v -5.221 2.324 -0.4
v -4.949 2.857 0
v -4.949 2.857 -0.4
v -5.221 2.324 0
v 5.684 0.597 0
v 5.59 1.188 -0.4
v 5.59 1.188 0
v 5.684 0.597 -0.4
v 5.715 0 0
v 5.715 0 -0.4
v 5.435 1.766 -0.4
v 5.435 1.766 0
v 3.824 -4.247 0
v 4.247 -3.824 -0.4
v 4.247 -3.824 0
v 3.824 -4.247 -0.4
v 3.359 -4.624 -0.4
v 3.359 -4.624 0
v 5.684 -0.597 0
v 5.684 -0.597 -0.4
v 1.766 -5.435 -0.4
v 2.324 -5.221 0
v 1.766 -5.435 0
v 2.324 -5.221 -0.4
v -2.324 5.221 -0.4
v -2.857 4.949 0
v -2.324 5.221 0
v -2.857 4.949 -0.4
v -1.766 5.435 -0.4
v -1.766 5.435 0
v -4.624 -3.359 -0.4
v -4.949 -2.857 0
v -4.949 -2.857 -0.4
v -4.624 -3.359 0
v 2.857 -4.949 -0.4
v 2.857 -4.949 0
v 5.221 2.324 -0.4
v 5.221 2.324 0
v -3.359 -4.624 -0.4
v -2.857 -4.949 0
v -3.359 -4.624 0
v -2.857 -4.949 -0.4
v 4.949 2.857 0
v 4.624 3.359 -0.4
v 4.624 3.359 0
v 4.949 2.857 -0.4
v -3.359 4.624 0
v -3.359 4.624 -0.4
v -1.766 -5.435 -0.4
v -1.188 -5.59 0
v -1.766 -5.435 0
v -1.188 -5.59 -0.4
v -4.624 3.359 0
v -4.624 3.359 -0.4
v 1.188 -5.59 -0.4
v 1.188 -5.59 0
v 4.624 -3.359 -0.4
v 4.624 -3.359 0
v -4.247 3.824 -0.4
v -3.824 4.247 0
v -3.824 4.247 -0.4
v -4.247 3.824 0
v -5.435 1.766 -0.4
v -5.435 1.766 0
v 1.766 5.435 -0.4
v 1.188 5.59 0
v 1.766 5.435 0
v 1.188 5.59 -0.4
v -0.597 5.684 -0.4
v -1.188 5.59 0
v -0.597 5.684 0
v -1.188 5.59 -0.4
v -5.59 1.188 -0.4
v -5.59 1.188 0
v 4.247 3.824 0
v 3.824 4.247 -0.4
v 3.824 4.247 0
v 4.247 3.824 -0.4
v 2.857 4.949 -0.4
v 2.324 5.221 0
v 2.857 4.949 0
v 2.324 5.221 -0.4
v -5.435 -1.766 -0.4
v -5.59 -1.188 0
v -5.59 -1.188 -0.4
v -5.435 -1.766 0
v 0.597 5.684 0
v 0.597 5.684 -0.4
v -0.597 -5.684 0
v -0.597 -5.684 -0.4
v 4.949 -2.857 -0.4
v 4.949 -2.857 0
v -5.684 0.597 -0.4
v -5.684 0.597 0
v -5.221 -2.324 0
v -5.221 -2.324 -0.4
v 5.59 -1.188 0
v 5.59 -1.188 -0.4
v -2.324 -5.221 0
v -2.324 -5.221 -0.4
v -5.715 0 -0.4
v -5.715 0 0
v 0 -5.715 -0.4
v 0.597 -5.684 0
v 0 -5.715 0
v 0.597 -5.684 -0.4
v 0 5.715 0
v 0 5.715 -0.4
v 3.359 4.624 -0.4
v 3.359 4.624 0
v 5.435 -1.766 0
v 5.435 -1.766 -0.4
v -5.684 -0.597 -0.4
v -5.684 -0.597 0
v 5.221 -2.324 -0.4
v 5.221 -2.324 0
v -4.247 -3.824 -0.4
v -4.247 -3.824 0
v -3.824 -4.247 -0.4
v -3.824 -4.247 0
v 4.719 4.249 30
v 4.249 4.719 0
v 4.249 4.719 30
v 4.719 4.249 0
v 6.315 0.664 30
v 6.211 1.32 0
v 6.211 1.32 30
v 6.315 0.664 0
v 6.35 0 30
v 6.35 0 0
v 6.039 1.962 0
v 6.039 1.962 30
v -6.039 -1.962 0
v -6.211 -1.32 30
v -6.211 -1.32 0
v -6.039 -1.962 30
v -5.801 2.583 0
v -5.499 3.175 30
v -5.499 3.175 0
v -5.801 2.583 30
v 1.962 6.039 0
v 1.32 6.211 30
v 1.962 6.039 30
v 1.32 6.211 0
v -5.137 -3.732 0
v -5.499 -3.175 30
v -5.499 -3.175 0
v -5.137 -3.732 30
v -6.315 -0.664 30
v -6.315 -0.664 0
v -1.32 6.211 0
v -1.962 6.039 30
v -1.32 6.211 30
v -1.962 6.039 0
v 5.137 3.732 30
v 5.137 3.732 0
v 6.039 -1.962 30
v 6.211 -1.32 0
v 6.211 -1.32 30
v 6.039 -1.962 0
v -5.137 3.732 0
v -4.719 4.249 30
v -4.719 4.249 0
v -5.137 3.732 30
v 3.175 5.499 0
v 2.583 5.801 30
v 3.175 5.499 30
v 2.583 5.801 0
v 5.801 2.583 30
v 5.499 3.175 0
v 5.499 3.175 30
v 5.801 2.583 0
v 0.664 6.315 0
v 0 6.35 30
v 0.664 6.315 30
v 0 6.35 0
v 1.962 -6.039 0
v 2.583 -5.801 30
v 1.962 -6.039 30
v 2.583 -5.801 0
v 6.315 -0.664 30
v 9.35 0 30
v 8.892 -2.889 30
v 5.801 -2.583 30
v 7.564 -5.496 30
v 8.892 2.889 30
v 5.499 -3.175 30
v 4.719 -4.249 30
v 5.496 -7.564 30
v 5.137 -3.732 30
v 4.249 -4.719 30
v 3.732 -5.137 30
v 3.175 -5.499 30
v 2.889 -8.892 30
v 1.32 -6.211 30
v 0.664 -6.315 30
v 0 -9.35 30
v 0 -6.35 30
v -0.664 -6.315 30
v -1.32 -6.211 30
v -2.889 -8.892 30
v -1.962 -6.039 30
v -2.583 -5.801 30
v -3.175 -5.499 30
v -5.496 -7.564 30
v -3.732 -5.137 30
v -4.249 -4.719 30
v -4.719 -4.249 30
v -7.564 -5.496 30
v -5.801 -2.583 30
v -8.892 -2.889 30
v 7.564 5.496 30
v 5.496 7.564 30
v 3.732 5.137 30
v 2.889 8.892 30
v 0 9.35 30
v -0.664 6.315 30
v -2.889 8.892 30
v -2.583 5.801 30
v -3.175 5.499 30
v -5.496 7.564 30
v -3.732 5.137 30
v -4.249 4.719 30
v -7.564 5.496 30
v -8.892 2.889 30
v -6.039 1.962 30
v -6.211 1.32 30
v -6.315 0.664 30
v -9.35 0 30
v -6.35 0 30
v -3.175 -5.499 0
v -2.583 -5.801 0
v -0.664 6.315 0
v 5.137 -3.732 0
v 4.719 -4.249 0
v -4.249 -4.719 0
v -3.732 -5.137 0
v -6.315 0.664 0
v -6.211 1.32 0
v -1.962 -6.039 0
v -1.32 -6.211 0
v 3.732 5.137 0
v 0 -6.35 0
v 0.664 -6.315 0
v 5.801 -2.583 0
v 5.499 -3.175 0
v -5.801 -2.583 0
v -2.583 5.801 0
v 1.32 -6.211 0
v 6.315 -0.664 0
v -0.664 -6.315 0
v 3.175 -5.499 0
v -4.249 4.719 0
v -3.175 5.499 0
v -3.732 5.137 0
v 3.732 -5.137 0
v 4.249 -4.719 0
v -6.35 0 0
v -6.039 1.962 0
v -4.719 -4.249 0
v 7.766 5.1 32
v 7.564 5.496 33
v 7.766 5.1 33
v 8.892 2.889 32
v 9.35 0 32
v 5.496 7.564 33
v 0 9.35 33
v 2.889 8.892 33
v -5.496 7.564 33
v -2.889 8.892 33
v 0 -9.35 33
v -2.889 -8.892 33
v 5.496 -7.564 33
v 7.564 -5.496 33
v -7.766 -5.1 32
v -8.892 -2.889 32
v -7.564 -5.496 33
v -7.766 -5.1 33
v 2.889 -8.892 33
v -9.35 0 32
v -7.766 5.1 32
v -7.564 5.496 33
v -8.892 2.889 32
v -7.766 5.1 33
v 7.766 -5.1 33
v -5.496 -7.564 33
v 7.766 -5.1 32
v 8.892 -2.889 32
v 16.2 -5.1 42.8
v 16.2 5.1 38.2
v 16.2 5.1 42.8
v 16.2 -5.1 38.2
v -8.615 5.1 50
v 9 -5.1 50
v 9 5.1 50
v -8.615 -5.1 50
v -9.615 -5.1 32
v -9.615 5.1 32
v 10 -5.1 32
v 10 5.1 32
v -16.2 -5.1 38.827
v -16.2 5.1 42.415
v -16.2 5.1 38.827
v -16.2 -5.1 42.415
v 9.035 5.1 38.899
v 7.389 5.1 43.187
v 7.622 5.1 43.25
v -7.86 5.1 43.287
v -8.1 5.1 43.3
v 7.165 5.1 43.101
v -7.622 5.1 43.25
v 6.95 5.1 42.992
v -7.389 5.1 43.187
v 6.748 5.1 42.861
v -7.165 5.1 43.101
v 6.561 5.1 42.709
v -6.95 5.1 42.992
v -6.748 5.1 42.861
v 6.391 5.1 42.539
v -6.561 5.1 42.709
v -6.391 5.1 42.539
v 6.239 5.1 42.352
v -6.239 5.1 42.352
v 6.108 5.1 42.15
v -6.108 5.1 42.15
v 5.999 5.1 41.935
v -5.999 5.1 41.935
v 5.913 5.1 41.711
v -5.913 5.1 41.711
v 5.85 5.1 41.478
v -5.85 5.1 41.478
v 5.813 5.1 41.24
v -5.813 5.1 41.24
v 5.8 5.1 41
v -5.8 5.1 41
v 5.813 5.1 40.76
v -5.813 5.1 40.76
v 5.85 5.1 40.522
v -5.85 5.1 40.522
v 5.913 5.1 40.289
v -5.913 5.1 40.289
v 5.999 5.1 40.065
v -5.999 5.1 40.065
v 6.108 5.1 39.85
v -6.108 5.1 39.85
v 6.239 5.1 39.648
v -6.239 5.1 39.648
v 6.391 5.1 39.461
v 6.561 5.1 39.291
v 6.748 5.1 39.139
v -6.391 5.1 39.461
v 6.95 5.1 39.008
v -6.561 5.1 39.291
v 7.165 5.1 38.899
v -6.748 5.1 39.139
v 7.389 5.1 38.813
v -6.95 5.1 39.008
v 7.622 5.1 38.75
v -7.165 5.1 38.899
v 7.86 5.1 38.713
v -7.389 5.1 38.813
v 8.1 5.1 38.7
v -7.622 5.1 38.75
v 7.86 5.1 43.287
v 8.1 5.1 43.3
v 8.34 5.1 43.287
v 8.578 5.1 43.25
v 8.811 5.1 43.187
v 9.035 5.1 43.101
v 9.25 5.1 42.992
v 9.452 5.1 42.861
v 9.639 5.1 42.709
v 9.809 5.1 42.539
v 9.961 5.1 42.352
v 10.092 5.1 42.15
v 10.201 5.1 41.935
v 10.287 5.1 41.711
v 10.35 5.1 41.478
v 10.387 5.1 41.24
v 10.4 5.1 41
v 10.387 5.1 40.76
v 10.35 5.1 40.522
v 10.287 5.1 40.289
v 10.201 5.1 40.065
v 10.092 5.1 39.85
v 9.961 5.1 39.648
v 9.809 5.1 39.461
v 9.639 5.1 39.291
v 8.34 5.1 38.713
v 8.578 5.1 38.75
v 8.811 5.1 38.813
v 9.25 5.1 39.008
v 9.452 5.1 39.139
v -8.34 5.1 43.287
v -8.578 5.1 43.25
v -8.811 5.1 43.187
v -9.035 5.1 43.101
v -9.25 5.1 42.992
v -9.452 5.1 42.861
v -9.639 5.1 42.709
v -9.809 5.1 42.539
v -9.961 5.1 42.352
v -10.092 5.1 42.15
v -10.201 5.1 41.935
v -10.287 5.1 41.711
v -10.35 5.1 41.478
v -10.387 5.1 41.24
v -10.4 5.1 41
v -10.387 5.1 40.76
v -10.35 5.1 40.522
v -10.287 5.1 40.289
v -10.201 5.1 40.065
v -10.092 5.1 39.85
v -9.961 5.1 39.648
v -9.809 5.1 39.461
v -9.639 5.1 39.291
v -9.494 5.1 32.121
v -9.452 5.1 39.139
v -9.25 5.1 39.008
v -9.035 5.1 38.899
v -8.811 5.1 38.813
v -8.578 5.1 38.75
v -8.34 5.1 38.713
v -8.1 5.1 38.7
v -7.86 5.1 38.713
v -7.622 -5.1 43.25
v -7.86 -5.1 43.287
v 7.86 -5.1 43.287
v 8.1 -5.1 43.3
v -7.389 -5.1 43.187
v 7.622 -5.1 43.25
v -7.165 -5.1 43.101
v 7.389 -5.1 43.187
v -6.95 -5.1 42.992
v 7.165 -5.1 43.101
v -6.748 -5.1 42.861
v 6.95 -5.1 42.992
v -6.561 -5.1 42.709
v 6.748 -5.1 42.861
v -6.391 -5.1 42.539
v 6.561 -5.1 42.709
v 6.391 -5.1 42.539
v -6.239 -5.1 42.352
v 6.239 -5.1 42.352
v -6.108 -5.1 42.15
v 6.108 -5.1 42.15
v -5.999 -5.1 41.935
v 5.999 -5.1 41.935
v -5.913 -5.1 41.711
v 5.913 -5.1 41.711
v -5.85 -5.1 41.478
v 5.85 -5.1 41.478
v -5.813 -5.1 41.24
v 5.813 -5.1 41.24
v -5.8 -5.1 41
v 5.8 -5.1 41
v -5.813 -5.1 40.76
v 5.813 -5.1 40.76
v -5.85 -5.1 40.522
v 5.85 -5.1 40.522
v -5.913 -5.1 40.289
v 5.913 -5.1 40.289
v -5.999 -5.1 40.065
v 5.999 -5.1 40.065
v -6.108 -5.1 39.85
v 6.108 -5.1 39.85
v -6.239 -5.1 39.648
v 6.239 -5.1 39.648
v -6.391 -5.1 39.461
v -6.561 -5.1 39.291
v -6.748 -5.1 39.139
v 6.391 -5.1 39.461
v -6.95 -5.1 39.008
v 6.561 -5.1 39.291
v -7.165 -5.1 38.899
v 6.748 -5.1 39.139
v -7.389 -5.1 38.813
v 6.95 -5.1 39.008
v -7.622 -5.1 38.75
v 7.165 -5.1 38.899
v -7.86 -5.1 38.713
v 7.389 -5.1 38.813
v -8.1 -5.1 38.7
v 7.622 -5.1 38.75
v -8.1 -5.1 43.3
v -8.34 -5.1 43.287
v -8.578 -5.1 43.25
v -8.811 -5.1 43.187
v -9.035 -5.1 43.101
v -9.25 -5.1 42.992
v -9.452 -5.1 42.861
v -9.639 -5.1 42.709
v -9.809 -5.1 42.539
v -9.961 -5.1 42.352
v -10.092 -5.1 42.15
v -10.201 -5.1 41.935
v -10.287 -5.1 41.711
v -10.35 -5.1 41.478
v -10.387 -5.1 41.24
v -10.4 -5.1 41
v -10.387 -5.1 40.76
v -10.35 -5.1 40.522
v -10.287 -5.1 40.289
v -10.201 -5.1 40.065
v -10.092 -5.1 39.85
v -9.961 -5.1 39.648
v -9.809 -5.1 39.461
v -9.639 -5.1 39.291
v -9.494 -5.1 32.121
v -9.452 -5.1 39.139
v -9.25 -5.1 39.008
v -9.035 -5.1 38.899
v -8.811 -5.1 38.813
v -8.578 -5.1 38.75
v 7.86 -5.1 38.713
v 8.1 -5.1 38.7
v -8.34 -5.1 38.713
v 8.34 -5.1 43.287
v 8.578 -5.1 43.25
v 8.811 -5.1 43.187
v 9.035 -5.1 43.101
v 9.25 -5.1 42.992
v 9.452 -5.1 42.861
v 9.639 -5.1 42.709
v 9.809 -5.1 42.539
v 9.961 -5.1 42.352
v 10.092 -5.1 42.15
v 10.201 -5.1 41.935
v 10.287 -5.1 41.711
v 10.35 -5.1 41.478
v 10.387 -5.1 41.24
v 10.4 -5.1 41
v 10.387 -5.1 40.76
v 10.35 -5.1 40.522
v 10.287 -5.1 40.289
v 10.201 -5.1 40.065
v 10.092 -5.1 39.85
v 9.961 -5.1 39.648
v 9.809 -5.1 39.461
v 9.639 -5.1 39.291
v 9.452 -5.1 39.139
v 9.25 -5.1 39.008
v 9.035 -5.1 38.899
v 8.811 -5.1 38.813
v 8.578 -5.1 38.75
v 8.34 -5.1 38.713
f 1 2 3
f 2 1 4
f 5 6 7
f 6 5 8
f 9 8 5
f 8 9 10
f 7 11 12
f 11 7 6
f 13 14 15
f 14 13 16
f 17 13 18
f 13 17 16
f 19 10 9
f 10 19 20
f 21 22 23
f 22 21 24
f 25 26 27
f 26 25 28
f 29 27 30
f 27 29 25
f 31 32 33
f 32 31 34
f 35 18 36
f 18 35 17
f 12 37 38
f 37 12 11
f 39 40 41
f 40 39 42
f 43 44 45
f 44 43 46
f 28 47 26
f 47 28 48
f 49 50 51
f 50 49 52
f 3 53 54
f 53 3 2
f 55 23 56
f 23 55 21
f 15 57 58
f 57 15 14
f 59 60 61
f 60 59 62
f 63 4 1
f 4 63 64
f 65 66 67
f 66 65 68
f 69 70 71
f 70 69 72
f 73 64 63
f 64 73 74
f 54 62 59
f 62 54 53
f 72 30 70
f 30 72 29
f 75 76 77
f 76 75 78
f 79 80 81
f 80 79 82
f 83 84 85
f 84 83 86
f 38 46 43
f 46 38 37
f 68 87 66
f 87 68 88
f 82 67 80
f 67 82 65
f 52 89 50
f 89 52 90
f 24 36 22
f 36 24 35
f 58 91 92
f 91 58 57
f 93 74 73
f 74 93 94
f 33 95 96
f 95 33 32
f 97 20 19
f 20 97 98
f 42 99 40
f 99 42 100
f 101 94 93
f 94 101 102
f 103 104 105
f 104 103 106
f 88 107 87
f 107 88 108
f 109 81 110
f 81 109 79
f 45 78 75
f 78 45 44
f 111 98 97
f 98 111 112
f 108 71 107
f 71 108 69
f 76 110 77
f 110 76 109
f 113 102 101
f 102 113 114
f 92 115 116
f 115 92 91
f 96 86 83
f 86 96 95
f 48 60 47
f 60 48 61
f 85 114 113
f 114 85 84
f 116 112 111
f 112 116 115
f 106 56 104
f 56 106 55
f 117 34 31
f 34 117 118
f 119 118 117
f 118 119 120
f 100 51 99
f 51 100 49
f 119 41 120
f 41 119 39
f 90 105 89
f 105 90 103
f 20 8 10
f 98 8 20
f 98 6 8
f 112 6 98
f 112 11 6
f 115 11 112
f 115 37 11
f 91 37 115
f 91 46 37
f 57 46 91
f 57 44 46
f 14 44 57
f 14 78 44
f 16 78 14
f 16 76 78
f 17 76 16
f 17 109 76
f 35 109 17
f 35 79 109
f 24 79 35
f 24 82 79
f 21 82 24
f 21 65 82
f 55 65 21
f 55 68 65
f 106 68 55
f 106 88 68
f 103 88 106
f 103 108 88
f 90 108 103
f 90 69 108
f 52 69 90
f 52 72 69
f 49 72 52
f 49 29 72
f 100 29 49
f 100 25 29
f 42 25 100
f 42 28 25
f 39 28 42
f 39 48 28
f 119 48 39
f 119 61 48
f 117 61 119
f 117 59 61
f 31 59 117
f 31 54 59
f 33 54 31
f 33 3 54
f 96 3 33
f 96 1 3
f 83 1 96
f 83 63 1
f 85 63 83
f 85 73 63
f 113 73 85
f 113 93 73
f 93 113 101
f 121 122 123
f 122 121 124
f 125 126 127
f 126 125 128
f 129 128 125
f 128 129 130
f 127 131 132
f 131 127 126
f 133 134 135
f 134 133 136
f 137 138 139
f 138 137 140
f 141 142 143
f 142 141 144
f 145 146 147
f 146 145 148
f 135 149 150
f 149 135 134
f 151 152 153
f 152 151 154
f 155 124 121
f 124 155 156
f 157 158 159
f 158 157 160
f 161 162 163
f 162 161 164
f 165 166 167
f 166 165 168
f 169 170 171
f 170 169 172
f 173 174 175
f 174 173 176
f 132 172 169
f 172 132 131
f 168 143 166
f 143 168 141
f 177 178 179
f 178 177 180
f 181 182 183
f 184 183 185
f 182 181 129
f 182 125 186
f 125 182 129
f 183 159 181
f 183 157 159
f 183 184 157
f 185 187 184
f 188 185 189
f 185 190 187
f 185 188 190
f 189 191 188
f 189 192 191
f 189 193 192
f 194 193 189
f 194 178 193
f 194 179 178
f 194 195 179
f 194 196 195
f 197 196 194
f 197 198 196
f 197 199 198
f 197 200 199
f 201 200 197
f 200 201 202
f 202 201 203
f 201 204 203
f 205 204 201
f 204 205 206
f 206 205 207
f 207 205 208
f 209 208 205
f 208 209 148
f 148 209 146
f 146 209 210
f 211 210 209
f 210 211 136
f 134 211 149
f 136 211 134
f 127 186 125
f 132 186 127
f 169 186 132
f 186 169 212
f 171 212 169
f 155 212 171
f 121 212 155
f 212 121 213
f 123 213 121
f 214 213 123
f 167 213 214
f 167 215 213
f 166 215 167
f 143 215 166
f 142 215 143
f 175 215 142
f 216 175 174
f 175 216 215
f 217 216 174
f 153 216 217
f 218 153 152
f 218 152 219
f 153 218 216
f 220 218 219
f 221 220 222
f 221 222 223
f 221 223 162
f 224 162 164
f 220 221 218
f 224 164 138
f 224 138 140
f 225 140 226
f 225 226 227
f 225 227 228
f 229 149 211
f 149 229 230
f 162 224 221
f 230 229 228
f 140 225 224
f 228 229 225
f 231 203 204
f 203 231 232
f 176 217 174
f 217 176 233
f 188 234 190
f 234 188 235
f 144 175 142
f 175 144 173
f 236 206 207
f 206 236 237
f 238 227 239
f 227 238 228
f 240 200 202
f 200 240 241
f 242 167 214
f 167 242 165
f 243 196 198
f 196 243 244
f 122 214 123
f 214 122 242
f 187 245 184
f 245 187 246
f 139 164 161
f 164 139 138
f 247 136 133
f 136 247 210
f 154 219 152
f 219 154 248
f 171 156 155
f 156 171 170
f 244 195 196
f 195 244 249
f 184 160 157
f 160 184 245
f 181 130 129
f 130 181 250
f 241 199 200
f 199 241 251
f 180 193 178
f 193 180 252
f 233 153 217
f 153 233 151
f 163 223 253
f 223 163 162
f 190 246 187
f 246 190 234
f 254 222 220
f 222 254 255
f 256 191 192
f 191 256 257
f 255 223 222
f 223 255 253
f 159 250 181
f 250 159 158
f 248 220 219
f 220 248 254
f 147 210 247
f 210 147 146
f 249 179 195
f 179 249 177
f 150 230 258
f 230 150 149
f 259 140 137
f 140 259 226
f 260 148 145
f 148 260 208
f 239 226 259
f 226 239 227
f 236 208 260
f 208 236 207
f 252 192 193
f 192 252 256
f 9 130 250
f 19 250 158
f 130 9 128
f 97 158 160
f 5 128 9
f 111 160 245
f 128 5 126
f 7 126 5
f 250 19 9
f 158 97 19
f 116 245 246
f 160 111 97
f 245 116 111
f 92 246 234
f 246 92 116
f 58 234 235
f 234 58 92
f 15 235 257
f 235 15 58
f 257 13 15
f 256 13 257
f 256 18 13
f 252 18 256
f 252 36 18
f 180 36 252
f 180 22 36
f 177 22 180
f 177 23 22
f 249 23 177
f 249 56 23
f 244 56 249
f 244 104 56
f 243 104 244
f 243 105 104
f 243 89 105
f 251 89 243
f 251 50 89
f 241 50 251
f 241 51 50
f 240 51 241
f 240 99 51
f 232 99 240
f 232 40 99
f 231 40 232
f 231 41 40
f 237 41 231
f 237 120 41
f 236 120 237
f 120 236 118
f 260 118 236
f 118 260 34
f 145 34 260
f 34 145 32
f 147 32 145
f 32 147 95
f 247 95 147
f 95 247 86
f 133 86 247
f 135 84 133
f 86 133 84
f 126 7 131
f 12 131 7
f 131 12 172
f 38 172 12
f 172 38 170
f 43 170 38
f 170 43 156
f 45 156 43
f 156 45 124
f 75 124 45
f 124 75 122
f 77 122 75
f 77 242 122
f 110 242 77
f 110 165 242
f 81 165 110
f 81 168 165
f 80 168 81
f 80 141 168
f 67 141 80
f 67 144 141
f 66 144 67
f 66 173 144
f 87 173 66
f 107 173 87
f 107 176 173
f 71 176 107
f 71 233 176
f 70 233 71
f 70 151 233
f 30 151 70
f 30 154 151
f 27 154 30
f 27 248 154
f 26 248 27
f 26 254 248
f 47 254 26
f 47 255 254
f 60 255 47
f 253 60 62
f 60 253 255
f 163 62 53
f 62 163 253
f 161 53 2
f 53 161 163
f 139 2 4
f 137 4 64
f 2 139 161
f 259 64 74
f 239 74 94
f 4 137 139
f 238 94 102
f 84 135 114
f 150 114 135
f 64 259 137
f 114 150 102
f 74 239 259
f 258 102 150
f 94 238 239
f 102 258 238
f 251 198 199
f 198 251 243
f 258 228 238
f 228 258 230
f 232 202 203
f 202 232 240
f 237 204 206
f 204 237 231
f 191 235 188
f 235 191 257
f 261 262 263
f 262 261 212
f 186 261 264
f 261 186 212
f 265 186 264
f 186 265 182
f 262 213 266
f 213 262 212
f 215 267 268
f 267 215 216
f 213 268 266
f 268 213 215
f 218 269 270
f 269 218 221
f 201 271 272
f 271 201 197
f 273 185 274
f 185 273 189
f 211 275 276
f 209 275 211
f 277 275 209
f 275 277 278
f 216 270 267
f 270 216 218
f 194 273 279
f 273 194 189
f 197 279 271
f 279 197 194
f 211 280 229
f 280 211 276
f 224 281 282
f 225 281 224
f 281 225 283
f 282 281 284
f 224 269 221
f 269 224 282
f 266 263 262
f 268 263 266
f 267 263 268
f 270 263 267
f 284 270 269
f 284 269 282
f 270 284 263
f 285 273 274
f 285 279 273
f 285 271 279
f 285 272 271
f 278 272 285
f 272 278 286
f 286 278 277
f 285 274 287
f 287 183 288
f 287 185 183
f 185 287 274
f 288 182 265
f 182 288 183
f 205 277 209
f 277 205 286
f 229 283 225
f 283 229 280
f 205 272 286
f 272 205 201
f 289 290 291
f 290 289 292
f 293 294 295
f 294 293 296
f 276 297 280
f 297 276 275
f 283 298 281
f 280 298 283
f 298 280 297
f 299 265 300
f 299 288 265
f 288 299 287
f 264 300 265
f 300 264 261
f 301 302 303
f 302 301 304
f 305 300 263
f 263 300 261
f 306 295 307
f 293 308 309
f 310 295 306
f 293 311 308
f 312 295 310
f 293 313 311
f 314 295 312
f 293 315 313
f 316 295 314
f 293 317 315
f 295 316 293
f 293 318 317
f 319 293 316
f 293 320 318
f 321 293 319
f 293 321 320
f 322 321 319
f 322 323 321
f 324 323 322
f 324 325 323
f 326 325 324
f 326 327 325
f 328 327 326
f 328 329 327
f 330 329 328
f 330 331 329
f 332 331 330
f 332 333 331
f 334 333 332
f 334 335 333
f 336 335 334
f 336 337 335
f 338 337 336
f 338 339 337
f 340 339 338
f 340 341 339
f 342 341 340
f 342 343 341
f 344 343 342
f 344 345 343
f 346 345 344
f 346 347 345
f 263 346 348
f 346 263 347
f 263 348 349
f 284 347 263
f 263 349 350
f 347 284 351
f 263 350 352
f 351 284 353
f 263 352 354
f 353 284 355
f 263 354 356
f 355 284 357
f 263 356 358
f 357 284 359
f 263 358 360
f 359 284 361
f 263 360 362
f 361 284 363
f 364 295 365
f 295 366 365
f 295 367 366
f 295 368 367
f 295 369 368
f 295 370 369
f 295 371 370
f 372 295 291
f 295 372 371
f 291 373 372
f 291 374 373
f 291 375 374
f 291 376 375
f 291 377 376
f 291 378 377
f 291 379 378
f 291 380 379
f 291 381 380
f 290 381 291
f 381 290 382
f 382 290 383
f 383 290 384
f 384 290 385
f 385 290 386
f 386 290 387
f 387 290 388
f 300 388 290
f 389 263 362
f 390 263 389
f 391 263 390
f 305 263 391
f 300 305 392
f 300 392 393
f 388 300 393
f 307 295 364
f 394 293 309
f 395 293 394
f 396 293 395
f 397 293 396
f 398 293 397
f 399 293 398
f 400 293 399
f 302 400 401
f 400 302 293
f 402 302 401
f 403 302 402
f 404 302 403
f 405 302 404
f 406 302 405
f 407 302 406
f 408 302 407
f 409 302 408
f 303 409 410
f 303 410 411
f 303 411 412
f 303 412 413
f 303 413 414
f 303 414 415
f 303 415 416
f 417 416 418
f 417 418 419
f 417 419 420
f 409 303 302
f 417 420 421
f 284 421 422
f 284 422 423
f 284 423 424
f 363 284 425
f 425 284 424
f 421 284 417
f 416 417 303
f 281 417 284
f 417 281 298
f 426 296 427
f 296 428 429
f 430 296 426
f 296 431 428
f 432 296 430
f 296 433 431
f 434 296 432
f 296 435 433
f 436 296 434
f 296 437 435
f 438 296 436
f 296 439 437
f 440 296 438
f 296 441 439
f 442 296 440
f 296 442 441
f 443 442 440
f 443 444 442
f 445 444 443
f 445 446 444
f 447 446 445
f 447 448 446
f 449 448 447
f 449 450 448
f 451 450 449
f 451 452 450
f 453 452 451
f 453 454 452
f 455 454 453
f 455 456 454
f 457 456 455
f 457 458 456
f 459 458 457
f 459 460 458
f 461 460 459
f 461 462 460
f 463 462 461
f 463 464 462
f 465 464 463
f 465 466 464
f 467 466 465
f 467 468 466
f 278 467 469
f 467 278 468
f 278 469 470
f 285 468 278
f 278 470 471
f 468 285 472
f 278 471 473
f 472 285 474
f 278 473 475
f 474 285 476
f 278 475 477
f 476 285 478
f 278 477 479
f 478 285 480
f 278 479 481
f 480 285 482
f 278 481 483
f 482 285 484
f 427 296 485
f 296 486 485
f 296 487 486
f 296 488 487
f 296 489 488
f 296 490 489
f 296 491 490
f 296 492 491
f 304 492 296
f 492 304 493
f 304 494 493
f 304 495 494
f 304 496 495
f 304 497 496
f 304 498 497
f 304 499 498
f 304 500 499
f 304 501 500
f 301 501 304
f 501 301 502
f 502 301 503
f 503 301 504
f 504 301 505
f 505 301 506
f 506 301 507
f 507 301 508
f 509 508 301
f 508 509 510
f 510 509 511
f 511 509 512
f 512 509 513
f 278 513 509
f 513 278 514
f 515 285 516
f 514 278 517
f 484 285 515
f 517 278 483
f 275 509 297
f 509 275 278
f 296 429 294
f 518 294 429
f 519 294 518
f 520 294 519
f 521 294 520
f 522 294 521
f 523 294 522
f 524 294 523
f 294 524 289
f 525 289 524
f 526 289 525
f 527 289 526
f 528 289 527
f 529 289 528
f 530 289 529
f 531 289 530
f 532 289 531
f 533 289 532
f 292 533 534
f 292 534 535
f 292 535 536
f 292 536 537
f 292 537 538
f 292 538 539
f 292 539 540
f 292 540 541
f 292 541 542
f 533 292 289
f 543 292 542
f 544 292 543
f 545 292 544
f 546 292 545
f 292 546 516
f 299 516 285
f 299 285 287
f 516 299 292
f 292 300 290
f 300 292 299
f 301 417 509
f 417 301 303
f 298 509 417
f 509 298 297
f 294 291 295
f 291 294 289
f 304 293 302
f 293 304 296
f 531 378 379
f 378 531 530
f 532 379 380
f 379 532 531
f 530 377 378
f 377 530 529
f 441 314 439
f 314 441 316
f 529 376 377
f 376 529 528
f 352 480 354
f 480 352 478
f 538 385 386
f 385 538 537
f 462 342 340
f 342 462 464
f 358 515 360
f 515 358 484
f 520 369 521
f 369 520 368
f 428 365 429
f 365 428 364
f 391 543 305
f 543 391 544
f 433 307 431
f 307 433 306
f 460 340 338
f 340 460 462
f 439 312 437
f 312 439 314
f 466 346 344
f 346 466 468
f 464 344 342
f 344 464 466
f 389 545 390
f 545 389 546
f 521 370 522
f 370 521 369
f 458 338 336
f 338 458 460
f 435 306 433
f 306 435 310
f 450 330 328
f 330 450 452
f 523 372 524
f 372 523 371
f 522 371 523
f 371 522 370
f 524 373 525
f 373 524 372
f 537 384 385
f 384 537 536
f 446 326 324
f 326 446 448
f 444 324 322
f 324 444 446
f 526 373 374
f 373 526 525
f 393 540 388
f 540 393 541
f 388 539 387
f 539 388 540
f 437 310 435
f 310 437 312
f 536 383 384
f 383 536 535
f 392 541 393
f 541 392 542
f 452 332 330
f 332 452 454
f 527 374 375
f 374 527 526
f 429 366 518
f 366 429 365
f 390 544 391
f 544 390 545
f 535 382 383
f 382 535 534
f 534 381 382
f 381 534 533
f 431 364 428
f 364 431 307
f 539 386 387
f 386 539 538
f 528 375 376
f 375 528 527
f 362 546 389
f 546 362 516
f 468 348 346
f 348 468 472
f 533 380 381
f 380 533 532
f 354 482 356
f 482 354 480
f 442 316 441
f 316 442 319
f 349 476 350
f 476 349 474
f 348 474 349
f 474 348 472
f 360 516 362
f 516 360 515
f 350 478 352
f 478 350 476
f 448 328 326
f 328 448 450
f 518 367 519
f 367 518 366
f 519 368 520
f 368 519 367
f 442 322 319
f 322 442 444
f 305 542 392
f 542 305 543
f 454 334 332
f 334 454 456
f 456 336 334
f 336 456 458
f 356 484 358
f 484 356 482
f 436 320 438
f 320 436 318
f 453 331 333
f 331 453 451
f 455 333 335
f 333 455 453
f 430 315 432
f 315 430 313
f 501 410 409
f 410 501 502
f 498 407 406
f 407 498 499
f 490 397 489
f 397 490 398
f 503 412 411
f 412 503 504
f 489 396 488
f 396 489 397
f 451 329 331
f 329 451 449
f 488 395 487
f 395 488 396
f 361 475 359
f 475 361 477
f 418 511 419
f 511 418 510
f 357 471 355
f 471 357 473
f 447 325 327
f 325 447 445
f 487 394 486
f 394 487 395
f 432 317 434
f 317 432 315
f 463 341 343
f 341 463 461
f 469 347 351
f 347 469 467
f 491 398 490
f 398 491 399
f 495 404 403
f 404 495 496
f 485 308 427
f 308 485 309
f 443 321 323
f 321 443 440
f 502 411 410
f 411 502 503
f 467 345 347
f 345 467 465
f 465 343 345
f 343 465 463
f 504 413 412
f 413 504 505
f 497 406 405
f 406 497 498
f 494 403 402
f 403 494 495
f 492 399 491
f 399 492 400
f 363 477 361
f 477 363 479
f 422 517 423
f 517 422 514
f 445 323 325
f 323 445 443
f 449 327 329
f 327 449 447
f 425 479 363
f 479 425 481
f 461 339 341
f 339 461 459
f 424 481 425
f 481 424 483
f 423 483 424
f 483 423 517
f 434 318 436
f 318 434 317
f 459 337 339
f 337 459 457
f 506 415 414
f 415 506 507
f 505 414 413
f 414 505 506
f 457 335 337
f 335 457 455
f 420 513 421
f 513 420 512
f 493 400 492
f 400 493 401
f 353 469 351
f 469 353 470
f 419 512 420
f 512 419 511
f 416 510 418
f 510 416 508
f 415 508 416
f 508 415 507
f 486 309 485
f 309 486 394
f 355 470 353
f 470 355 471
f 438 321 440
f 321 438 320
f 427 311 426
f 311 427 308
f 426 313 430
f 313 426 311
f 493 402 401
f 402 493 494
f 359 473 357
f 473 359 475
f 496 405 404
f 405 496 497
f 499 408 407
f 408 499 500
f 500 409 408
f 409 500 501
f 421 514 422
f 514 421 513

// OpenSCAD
// lamp foot center pin
//
// Title:        Parametric lamp foot
// Version:      1.007
// Release Date: 20170429 (ISO)
// Author:       David Larsson
//
// customizable insize

// #################################
// customizer notation by David Larsson 20170429

// foot pin diameter
pin_dia=12.7; // [6:22]

// foot pin length
pin_len=30; // [12:42]

//Diameter of screw holes
hole=2.3; // [1.2:4.6]

//Distance between screw holes
hole_dist=16.2; // [10:18]

// width of screw block
wi=10.2; // [6:22]

difference() {
    union() {

translate([0,0,-.4])
cylinder(pin_len,.9*pin_dia/2,.9*pin_dia/2,$fn=60);
cylinder(pin_len,pin_dia/2,pin_dia/2,$fn=60);
translate([0,0,pin_len])
    cylinder(3,3+pin_dia/2,3+pin_dia/2,$fn=20);
translate([0,0,41])
    cube([2*hole_dist,wi,18],center=true);
    }
color("red") {
translate([10,-wi/2-.5,32])
rotate([0,45,0])
    cube([wi+3,wi+1,16]);
translate([-pin_len,-wi/2-.5,pin_len])
rotate([0,45,0])
    cube([13,wi+1,16]);

translate([7,-wi/2-.5,52])
rotate([0,45,0])
    cube([16,wi+1,16]);
translate([-pin_len,-wi/2-.5,47])
rotate([0,45,0])
    cube([13,wi+1,19]);

translate([hole_dist/2,wi,41])
rotate([90,0,0])
    cylinder(pin_len,hole,hole,$fn=60);
translate([-hole_dist/2,wi,41])
rotate([90,0,0])
    cylinder(pin_len,hole,hole,$fn=60);
}
}
